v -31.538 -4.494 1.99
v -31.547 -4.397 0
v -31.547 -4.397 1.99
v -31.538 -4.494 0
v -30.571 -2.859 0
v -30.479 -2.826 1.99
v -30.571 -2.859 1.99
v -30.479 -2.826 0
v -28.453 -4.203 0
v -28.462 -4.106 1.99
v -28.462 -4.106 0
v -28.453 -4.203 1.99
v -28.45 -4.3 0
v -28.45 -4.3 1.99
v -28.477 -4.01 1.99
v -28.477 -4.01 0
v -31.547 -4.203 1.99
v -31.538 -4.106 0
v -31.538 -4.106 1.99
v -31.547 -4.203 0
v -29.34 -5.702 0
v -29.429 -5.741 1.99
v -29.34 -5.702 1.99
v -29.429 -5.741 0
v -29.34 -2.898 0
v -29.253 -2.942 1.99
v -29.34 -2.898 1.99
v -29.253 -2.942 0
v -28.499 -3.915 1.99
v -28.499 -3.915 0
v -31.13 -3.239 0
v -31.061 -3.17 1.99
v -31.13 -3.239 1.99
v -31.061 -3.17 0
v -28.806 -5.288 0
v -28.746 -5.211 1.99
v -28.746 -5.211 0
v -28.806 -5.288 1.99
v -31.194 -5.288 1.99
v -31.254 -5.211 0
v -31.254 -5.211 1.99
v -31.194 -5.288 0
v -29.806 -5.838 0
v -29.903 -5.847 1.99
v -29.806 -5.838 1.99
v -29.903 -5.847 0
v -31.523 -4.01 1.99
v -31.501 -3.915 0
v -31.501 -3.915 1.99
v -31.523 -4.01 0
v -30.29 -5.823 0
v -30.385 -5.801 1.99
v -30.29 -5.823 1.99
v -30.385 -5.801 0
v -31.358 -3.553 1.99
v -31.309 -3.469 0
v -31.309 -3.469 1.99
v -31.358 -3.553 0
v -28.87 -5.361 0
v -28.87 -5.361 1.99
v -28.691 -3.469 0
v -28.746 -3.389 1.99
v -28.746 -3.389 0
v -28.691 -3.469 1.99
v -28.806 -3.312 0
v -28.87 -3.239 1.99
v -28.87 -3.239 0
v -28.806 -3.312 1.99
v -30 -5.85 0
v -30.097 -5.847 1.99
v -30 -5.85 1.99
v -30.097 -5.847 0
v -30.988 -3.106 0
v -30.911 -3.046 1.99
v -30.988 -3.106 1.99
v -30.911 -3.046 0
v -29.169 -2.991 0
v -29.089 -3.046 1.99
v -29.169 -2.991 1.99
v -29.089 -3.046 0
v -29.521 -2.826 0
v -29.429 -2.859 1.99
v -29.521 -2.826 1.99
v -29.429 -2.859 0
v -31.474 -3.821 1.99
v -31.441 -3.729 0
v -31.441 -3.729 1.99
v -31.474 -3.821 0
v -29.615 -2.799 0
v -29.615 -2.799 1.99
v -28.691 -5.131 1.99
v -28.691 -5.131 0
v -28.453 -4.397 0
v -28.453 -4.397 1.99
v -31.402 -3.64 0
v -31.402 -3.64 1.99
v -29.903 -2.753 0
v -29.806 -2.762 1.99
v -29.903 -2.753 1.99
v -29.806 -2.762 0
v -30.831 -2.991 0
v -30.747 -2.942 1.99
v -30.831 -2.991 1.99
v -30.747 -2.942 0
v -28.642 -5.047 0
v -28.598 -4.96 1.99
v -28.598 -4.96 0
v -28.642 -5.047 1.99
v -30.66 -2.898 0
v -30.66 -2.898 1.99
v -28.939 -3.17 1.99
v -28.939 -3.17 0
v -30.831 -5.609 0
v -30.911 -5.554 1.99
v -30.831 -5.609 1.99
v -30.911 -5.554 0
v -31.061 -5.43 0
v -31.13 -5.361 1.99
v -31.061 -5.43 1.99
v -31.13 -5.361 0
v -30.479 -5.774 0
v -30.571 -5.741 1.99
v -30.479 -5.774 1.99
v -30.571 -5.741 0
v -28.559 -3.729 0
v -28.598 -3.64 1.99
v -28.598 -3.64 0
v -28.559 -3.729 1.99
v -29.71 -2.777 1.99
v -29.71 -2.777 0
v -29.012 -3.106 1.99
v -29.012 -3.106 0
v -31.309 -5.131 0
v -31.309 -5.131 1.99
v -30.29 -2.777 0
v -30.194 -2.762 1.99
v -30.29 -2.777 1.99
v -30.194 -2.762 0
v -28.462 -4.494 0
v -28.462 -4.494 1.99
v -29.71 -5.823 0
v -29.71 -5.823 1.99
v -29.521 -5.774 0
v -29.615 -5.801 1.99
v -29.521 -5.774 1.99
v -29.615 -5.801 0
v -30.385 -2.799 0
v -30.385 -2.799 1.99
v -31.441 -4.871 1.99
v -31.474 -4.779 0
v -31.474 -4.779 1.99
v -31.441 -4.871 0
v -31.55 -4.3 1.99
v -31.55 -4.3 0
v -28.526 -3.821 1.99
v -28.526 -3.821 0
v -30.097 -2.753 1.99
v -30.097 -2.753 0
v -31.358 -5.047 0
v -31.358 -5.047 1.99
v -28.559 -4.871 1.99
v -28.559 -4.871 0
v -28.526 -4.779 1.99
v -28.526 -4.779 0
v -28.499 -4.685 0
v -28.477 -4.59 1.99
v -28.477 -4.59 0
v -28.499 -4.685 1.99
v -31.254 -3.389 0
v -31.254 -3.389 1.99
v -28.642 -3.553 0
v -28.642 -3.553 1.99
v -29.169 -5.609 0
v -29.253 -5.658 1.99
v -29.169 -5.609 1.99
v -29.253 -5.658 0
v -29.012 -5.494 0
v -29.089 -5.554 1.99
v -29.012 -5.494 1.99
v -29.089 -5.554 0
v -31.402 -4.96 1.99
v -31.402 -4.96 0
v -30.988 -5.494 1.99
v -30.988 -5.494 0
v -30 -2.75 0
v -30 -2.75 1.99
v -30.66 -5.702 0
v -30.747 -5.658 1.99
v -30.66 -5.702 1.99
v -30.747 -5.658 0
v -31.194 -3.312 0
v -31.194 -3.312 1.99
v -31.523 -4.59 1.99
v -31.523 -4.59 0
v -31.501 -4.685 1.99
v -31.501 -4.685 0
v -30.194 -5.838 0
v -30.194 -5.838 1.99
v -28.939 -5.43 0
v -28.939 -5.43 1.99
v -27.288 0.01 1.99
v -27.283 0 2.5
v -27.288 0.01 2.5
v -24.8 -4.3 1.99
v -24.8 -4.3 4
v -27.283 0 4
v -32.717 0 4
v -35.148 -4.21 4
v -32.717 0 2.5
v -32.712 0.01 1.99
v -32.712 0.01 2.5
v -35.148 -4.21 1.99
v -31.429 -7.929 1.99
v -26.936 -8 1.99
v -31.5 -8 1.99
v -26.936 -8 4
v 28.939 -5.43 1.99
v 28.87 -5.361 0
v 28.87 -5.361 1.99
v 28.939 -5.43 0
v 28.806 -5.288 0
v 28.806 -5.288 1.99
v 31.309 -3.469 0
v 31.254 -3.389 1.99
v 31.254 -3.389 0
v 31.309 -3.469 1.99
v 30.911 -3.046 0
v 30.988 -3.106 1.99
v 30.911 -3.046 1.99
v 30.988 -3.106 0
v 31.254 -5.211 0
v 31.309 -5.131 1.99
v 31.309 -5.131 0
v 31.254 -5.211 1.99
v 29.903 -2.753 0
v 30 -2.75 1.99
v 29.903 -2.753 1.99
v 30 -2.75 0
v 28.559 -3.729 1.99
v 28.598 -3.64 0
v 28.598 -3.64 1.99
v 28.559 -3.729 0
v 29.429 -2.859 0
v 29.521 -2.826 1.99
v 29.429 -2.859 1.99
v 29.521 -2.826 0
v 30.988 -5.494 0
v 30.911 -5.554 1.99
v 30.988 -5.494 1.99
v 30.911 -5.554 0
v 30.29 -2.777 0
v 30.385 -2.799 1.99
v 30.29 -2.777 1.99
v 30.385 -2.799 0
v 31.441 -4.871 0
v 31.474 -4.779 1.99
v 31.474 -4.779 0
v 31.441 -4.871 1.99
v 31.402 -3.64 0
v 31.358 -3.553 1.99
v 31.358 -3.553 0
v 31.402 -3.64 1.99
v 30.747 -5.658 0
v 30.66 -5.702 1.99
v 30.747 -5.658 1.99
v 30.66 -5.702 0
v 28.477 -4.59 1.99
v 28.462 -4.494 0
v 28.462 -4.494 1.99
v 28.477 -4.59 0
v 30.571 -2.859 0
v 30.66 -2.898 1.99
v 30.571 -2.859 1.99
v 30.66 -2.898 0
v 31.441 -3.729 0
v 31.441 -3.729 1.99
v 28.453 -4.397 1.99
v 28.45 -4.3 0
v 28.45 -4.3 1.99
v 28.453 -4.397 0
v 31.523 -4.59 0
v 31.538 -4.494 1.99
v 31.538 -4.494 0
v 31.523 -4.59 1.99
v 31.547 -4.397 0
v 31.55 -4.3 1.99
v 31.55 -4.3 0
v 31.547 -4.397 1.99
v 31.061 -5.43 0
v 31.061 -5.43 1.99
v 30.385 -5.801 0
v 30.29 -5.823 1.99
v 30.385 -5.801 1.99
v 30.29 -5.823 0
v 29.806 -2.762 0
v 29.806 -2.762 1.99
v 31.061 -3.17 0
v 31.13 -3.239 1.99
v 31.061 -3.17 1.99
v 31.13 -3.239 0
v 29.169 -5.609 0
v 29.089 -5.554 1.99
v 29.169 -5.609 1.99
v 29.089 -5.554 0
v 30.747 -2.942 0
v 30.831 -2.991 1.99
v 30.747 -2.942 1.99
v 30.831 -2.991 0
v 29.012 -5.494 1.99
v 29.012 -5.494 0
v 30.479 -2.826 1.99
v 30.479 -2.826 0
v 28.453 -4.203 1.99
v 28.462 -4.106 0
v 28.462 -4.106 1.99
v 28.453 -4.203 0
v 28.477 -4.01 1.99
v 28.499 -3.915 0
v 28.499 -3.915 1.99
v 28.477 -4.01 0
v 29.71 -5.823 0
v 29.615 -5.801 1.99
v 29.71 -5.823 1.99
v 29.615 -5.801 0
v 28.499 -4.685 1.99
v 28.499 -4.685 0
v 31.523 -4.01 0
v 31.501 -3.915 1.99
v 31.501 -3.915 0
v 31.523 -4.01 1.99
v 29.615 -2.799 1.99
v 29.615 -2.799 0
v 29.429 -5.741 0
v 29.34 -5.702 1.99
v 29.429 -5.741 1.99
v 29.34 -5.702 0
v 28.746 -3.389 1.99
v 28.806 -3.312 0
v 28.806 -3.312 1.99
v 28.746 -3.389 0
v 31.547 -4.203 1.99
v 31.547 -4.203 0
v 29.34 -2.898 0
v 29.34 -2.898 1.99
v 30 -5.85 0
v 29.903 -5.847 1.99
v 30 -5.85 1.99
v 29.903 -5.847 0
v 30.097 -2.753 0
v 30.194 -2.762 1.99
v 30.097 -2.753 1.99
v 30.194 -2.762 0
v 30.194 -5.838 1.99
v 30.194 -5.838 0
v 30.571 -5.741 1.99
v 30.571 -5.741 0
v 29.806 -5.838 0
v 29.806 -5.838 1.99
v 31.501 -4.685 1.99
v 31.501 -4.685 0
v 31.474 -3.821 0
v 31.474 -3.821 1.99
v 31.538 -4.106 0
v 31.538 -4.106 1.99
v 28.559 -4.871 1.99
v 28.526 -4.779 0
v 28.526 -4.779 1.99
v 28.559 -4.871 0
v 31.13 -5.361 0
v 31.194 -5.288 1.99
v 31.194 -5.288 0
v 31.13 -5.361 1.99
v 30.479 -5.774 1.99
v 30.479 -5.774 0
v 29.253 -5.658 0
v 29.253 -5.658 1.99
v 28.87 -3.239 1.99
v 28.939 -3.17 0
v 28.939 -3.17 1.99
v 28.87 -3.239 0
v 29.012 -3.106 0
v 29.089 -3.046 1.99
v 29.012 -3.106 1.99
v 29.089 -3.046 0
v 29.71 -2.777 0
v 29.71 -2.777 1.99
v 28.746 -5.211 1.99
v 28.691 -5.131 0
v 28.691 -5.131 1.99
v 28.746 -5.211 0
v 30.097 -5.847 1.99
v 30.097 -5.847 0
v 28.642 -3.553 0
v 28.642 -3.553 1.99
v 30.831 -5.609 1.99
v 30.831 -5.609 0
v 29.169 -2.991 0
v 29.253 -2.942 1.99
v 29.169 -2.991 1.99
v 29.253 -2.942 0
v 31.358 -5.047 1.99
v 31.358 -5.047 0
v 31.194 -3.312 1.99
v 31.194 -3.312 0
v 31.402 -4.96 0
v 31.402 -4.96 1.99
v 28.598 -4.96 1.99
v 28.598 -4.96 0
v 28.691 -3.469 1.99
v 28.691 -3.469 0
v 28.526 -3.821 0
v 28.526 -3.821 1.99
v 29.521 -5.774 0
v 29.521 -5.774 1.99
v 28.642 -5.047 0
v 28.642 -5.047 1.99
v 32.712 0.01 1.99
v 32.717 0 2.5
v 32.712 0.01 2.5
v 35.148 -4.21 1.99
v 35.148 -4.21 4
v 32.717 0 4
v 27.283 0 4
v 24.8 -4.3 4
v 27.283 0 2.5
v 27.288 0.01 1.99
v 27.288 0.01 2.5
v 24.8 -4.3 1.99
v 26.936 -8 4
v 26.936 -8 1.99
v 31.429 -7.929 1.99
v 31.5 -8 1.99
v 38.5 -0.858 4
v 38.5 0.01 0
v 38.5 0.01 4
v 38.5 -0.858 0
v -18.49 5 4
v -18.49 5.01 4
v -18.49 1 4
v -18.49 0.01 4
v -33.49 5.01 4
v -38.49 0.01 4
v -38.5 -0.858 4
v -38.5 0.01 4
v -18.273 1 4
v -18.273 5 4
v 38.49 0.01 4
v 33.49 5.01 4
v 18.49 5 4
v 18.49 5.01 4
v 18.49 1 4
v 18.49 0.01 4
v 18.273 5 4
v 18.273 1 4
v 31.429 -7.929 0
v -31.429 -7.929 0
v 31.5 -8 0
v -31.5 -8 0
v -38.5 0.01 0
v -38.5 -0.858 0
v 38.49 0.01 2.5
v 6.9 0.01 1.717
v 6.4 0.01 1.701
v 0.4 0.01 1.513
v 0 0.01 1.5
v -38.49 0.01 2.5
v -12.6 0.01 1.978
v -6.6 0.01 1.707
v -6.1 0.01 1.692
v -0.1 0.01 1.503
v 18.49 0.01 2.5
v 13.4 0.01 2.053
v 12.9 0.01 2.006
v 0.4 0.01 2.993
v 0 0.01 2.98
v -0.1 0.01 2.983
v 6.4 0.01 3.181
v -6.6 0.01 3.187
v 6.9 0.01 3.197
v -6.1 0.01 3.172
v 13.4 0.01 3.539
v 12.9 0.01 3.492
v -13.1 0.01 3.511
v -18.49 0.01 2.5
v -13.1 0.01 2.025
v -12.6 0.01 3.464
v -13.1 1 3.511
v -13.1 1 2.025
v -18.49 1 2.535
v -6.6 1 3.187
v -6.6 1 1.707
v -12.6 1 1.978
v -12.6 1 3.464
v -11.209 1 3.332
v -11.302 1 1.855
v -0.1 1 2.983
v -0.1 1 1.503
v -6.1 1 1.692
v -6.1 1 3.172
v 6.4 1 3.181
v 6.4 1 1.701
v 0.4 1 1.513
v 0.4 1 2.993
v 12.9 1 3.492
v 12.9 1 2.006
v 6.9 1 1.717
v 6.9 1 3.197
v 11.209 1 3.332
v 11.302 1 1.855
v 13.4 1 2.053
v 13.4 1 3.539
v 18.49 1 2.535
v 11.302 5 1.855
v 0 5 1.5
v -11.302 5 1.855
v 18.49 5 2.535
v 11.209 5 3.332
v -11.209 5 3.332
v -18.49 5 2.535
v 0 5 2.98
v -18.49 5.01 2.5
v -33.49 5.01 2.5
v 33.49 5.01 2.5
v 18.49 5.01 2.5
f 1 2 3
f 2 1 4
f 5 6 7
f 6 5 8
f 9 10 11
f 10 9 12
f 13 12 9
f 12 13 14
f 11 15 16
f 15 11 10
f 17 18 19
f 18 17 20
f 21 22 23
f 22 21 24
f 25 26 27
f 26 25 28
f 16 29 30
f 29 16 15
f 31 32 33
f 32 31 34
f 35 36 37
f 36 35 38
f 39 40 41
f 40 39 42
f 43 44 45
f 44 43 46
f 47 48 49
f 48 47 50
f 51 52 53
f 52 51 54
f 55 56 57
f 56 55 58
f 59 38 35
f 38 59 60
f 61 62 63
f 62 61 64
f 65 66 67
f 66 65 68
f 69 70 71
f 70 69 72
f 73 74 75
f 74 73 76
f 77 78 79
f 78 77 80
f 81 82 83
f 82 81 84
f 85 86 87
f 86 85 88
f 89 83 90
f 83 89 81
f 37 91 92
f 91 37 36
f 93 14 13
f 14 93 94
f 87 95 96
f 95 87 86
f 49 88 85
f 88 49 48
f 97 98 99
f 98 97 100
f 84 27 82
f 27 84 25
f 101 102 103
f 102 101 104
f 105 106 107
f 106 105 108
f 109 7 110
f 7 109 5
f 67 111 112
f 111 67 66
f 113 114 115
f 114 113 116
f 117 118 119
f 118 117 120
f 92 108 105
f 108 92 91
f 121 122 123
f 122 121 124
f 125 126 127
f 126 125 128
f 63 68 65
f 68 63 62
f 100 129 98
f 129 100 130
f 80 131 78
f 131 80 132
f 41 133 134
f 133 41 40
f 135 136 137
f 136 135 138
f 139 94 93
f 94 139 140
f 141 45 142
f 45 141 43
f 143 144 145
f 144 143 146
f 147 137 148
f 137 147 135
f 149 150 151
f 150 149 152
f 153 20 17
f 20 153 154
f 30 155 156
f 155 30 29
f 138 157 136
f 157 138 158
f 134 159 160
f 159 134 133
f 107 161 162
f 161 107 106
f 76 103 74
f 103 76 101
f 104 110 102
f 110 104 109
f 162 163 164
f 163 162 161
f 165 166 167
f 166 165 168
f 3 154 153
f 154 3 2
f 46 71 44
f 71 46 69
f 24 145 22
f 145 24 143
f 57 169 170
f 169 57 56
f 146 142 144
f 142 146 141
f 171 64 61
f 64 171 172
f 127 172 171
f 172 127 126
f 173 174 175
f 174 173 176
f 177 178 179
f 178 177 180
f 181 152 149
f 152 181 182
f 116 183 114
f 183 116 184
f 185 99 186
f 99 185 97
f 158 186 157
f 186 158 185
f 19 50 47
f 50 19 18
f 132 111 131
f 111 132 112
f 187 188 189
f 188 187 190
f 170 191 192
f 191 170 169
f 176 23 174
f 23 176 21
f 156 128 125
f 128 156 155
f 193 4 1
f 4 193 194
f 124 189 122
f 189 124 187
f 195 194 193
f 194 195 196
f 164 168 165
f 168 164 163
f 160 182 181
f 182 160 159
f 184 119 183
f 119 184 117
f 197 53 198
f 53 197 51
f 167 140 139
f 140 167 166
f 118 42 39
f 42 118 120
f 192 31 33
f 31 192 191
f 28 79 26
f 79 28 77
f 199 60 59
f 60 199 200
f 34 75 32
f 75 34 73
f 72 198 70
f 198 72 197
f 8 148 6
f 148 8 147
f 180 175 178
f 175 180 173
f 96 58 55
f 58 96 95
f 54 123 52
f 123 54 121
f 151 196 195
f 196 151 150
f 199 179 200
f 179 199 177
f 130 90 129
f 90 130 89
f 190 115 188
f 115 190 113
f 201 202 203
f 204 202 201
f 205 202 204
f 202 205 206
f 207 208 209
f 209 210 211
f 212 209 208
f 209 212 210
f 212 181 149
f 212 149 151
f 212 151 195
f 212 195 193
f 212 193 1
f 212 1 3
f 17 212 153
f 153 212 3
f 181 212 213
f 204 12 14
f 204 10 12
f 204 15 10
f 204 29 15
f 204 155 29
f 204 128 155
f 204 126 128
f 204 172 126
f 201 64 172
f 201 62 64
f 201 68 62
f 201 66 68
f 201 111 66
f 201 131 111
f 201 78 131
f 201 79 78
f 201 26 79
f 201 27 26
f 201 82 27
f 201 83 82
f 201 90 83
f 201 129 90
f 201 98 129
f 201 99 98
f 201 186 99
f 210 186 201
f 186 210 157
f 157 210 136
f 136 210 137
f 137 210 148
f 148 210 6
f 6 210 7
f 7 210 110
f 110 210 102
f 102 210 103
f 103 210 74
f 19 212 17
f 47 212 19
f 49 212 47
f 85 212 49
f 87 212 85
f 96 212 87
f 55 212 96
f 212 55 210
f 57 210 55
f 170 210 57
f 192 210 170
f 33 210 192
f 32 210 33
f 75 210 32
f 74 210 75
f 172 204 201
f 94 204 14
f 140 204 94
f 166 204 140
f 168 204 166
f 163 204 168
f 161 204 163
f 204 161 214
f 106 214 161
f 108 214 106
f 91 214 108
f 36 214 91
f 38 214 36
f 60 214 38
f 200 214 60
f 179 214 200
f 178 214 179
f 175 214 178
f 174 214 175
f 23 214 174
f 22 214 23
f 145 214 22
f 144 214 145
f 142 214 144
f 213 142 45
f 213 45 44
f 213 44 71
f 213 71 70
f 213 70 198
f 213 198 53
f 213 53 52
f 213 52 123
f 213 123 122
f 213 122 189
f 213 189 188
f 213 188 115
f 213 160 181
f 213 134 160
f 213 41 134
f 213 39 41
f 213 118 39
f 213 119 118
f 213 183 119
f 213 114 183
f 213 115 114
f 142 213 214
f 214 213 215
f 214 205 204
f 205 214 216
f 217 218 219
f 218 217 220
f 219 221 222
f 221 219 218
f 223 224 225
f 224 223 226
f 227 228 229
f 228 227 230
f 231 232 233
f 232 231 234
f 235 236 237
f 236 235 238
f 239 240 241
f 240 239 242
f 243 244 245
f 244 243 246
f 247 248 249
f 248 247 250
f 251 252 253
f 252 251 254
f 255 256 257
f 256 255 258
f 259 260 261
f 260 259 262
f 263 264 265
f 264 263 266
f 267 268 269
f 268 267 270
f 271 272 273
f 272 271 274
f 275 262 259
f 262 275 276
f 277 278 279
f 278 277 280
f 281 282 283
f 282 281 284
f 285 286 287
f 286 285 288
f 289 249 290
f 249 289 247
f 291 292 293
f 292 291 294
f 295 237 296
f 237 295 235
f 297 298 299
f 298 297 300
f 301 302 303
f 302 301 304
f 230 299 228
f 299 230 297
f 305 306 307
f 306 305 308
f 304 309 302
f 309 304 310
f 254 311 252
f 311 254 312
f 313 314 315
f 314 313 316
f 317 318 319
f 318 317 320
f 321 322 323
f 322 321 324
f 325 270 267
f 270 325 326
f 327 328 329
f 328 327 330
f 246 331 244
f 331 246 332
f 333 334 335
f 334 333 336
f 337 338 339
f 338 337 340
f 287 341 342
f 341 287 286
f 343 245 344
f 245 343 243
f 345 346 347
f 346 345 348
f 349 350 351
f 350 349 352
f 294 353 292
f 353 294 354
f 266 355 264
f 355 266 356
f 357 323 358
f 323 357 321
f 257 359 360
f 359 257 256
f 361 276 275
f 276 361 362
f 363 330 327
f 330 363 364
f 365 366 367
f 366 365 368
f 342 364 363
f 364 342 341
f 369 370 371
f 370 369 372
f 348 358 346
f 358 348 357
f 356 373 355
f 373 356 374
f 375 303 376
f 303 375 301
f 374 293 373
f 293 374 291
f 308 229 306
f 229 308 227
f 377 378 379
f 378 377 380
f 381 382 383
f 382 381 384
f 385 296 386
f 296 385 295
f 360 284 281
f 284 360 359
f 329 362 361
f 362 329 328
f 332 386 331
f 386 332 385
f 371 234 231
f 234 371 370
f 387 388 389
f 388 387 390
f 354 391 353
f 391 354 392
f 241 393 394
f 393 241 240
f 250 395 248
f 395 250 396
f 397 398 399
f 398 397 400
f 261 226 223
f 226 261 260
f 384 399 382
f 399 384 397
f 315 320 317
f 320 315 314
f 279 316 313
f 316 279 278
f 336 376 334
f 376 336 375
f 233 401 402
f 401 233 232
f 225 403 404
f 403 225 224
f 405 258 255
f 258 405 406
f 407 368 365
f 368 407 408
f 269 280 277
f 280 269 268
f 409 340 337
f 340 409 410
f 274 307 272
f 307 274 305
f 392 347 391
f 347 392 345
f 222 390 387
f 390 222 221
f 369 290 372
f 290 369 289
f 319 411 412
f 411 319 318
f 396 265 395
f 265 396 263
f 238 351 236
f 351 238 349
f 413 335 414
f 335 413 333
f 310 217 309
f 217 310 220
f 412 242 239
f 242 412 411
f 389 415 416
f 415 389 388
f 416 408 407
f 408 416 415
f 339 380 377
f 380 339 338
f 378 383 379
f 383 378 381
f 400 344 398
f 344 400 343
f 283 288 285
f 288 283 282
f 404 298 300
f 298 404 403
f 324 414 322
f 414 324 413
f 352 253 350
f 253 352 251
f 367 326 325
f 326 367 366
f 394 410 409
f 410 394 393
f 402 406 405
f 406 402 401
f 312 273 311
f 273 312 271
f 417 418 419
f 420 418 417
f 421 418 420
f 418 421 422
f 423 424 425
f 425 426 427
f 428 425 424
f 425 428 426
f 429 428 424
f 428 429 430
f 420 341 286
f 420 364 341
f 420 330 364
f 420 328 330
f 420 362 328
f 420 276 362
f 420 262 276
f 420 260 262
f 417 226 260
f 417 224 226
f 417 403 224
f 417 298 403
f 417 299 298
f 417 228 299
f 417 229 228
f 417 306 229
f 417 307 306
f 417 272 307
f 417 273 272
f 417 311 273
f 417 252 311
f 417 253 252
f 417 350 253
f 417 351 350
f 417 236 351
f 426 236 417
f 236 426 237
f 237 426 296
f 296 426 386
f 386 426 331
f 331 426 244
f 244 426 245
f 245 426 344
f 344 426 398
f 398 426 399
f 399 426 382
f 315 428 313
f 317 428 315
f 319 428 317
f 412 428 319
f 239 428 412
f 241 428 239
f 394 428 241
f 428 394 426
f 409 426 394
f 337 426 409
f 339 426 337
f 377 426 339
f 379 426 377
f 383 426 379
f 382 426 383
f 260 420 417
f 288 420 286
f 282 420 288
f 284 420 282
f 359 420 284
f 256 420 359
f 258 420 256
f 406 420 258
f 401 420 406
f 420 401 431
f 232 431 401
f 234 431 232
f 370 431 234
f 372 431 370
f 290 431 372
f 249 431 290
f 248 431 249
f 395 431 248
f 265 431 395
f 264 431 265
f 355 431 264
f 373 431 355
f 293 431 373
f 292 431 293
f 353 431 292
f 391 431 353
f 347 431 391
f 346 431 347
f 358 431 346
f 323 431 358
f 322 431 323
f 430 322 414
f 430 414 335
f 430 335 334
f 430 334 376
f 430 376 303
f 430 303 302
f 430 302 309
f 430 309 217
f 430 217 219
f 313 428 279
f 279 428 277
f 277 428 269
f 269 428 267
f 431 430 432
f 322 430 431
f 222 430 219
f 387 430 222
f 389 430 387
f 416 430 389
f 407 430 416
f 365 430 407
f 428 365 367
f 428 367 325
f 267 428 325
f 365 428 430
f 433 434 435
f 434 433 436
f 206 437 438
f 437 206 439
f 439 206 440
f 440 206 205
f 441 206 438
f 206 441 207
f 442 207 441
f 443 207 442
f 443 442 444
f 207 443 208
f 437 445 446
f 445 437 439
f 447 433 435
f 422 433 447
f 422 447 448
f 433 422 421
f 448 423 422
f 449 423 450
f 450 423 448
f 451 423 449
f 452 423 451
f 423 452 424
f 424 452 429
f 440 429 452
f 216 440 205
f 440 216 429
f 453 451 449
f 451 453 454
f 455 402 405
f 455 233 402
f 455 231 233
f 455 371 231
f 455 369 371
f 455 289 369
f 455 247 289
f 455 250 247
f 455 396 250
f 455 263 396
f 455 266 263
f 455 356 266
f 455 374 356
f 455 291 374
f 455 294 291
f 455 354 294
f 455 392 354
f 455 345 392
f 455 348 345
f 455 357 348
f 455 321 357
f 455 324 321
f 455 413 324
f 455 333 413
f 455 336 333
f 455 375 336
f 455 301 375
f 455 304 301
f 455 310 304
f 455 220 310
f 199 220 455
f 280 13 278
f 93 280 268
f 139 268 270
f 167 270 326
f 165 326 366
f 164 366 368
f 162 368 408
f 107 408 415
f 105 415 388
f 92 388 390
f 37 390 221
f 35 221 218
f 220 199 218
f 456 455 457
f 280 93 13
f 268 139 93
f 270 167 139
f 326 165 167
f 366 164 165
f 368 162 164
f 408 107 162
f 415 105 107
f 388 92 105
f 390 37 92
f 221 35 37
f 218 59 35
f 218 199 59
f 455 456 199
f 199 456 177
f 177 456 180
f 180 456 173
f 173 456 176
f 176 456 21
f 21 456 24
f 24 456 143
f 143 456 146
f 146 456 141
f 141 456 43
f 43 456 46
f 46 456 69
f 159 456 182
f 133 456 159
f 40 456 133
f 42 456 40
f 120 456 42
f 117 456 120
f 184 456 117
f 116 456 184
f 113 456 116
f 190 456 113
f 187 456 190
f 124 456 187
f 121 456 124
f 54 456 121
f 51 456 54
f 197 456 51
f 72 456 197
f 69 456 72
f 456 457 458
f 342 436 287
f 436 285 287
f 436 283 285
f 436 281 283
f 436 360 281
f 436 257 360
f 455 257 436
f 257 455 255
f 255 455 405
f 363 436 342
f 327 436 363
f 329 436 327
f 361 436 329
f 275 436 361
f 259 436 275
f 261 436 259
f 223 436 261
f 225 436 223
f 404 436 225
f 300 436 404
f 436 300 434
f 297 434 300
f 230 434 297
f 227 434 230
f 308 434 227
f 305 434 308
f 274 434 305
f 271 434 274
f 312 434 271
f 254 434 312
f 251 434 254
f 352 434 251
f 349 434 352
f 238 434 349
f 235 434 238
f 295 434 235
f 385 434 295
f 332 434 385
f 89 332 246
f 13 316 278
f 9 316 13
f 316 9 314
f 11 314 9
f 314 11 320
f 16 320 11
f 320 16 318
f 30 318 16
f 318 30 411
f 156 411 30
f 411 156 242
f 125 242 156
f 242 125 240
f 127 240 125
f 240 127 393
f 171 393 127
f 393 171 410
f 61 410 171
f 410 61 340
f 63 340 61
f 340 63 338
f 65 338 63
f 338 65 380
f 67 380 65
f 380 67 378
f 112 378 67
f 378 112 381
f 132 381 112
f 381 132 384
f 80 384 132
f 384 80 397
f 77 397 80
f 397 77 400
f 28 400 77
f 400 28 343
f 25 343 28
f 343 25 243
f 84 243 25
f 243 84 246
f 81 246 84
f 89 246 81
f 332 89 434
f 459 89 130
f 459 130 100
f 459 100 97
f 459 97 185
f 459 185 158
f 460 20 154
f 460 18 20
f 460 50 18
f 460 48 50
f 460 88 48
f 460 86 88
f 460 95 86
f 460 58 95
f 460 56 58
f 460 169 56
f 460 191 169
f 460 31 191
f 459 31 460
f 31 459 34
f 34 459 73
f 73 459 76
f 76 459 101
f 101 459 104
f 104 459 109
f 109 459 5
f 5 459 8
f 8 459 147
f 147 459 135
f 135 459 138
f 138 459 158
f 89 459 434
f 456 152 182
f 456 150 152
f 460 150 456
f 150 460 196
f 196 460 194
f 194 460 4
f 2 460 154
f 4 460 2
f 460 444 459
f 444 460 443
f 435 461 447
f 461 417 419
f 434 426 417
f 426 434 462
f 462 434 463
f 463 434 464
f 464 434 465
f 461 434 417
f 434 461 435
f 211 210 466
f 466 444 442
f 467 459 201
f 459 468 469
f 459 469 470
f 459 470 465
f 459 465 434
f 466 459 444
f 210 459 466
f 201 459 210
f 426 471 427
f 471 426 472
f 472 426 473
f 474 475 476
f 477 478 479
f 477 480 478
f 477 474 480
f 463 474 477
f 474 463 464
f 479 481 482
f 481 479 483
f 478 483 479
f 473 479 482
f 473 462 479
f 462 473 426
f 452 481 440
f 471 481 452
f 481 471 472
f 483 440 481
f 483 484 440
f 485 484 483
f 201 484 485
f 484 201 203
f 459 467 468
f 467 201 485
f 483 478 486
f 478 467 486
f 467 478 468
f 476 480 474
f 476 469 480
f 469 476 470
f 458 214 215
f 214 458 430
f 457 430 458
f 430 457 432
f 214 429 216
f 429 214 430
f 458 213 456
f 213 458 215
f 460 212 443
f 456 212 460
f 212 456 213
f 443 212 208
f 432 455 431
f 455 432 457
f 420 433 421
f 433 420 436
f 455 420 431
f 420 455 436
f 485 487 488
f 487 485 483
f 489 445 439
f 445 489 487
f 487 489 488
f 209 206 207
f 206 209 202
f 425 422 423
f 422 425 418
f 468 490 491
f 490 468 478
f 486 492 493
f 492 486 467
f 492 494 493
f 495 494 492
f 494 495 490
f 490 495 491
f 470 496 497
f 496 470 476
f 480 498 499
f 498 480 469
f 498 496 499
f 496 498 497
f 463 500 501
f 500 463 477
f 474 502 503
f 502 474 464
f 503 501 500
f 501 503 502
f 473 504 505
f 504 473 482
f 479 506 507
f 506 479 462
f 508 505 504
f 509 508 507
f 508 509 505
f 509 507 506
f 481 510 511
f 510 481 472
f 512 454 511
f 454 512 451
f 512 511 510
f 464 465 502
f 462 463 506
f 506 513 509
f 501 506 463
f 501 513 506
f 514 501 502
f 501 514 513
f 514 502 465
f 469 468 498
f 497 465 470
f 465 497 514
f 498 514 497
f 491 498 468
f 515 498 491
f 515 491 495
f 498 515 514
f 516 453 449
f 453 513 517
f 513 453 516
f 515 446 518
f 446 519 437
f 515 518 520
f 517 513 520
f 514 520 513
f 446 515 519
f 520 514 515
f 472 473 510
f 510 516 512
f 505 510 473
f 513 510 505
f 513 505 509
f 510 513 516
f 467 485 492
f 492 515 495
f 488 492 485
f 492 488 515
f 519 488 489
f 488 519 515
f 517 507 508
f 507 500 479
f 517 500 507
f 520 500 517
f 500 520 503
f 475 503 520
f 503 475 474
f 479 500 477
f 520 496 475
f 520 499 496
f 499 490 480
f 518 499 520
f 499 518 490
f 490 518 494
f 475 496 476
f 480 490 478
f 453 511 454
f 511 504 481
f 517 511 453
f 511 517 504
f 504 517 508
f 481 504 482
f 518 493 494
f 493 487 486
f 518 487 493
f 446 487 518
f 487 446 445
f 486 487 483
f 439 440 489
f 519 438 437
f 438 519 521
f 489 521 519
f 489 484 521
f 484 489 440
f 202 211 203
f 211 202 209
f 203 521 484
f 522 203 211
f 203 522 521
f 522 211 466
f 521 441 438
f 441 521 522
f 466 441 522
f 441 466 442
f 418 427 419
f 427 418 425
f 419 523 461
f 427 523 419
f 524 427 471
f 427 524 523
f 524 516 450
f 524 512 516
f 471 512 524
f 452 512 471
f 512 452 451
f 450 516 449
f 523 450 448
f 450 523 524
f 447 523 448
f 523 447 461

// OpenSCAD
//
// Filter Slot for Formatt Hitech 67mm Filter
// Copyright (C) 2021 Uwe Glässner
//

// slot lengths (mm)
l = 77; // total length
l1 = 20;  // length until curve 
// slot widths (mm)
w1 = 8;
w2 = 1.0;
w3 = 4.0;
w  = w1+w2+w3;
// slot height (mm)
h1 = 1.5; // curvature thickness
cr = 180; // curvature radius
of = 1.5; // curvature offset for 2mm firecrest filters (instead of 1.4mm Resin) 
h = 4; // total height

D = 0.01; // generic overlap of parts.

module loch(posx,posy){
    union(){
       translate([posx, posy,-D]) cylinder(d=3.1, h=h+2*D, $fn=100);
       translate([posx, posy,-D+(h-2.0)]) cylinder(d=10.4, h=h+2*D, $fn=6);
    }
}


// thick side of holder with holes and removed corners
difference(){
   translate([-l/2,-w1,0]) cube([l,w1+D,h]);
   loch(-l/2+8.5, -8+3.7); 
   loch( l/2-8.5, -8+3.7); 

   translate([-l/2,-15,-D]) rotate([0,0,45]) cube([10,10,h+2*D]);

   translate([l/2,-15,-D]) rotate([0,0,45]) cube([10,10,h+2*D]);
   }

// Arc on thin side
intersection(){
    translate([-l/2,0,0]) cube([l,w2+w3,h]);
    difference(){
       translate([0,w3+w2,cr+of]) rotate ([90,90,0]) cylinder(r=cr,h=w3+w2, $fn=100);
       translate([0,w3+w2+D,cr+of]) rotate ([90,90,0]) cylinder(r=cr-h1+2*D,h=w3+w2+2*D, $fn=100);
       // remove pillars under bridge
       for (i=[0:5]) translate([-l/2+l1+i*6.5-0.6,0,-D+of/2]) cube([6.0,w2,h]);
    }
}  
        
// Add thin sides with removed corners
difference(){
   translate([-l/2-D,0,h-h1]) cube([l1+2*D,w2+w3+D,h1]);
   translate([-l/2-1,-1,-D]) rotate([0,0,45]) cube([10,10,h+2*D]);   
}
difference(){
   translate([ l/2-l1-D,0,h-h1]) cube([l1+2*D,w2+w3+D,h1]);
   translate([l/2+1,-1,-D]) rotate([0,0,45]) cube([10,10,h+2*D]);
}





 
